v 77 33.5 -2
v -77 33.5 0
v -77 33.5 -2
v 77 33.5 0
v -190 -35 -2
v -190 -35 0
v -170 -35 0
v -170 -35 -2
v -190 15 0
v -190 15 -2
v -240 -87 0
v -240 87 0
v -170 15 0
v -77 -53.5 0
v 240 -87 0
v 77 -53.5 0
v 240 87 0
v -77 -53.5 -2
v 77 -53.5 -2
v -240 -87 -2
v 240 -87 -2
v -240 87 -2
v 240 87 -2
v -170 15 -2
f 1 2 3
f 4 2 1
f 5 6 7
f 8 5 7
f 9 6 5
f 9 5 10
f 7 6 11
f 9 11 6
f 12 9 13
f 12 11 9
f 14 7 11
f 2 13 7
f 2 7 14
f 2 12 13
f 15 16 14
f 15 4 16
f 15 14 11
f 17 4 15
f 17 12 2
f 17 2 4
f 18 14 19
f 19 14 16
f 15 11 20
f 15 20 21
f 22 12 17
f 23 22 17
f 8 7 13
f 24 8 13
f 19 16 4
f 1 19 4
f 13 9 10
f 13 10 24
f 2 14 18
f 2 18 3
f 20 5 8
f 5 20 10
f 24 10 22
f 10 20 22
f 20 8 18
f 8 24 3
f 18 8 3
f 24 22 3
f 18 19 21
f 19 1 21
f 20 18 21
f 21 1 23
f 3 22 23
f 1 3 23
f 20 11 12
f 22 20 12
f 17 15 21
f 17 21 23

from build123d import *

# Parameters (mm, degrees)
SKETCH1_W           = 480
SKETCH1_H           = 174
SKETCH1_W_2         = 154
SKETCH1_H_2         = 87
SKETCH1_W_3         = 20
SKETCH1_H_3         = 50
BOSS_EXTRUDE1_DEPTH = 2


with BuildPart() as part:
    # Sketch1 → Boss-Extrude1 (new body)
    with BuildSketch(Plane.XY):
        Rectangle(SKETCH1_W, SKETCH1_H)
        with Locations((0, -10)):
            Rectangle(SKETCH1_W_2, SKETCH1_H_2, mode=Mode.SUBTRACT)
        with Locations((-180, -10)):
            Rectangle(SKETCH1_W_3, SKETCH1_H_3, mode=Mode.SUBTRACT)
    extrude(amount=-BOSS_EXTRUDE1_DEPTH)


solid = part.part
